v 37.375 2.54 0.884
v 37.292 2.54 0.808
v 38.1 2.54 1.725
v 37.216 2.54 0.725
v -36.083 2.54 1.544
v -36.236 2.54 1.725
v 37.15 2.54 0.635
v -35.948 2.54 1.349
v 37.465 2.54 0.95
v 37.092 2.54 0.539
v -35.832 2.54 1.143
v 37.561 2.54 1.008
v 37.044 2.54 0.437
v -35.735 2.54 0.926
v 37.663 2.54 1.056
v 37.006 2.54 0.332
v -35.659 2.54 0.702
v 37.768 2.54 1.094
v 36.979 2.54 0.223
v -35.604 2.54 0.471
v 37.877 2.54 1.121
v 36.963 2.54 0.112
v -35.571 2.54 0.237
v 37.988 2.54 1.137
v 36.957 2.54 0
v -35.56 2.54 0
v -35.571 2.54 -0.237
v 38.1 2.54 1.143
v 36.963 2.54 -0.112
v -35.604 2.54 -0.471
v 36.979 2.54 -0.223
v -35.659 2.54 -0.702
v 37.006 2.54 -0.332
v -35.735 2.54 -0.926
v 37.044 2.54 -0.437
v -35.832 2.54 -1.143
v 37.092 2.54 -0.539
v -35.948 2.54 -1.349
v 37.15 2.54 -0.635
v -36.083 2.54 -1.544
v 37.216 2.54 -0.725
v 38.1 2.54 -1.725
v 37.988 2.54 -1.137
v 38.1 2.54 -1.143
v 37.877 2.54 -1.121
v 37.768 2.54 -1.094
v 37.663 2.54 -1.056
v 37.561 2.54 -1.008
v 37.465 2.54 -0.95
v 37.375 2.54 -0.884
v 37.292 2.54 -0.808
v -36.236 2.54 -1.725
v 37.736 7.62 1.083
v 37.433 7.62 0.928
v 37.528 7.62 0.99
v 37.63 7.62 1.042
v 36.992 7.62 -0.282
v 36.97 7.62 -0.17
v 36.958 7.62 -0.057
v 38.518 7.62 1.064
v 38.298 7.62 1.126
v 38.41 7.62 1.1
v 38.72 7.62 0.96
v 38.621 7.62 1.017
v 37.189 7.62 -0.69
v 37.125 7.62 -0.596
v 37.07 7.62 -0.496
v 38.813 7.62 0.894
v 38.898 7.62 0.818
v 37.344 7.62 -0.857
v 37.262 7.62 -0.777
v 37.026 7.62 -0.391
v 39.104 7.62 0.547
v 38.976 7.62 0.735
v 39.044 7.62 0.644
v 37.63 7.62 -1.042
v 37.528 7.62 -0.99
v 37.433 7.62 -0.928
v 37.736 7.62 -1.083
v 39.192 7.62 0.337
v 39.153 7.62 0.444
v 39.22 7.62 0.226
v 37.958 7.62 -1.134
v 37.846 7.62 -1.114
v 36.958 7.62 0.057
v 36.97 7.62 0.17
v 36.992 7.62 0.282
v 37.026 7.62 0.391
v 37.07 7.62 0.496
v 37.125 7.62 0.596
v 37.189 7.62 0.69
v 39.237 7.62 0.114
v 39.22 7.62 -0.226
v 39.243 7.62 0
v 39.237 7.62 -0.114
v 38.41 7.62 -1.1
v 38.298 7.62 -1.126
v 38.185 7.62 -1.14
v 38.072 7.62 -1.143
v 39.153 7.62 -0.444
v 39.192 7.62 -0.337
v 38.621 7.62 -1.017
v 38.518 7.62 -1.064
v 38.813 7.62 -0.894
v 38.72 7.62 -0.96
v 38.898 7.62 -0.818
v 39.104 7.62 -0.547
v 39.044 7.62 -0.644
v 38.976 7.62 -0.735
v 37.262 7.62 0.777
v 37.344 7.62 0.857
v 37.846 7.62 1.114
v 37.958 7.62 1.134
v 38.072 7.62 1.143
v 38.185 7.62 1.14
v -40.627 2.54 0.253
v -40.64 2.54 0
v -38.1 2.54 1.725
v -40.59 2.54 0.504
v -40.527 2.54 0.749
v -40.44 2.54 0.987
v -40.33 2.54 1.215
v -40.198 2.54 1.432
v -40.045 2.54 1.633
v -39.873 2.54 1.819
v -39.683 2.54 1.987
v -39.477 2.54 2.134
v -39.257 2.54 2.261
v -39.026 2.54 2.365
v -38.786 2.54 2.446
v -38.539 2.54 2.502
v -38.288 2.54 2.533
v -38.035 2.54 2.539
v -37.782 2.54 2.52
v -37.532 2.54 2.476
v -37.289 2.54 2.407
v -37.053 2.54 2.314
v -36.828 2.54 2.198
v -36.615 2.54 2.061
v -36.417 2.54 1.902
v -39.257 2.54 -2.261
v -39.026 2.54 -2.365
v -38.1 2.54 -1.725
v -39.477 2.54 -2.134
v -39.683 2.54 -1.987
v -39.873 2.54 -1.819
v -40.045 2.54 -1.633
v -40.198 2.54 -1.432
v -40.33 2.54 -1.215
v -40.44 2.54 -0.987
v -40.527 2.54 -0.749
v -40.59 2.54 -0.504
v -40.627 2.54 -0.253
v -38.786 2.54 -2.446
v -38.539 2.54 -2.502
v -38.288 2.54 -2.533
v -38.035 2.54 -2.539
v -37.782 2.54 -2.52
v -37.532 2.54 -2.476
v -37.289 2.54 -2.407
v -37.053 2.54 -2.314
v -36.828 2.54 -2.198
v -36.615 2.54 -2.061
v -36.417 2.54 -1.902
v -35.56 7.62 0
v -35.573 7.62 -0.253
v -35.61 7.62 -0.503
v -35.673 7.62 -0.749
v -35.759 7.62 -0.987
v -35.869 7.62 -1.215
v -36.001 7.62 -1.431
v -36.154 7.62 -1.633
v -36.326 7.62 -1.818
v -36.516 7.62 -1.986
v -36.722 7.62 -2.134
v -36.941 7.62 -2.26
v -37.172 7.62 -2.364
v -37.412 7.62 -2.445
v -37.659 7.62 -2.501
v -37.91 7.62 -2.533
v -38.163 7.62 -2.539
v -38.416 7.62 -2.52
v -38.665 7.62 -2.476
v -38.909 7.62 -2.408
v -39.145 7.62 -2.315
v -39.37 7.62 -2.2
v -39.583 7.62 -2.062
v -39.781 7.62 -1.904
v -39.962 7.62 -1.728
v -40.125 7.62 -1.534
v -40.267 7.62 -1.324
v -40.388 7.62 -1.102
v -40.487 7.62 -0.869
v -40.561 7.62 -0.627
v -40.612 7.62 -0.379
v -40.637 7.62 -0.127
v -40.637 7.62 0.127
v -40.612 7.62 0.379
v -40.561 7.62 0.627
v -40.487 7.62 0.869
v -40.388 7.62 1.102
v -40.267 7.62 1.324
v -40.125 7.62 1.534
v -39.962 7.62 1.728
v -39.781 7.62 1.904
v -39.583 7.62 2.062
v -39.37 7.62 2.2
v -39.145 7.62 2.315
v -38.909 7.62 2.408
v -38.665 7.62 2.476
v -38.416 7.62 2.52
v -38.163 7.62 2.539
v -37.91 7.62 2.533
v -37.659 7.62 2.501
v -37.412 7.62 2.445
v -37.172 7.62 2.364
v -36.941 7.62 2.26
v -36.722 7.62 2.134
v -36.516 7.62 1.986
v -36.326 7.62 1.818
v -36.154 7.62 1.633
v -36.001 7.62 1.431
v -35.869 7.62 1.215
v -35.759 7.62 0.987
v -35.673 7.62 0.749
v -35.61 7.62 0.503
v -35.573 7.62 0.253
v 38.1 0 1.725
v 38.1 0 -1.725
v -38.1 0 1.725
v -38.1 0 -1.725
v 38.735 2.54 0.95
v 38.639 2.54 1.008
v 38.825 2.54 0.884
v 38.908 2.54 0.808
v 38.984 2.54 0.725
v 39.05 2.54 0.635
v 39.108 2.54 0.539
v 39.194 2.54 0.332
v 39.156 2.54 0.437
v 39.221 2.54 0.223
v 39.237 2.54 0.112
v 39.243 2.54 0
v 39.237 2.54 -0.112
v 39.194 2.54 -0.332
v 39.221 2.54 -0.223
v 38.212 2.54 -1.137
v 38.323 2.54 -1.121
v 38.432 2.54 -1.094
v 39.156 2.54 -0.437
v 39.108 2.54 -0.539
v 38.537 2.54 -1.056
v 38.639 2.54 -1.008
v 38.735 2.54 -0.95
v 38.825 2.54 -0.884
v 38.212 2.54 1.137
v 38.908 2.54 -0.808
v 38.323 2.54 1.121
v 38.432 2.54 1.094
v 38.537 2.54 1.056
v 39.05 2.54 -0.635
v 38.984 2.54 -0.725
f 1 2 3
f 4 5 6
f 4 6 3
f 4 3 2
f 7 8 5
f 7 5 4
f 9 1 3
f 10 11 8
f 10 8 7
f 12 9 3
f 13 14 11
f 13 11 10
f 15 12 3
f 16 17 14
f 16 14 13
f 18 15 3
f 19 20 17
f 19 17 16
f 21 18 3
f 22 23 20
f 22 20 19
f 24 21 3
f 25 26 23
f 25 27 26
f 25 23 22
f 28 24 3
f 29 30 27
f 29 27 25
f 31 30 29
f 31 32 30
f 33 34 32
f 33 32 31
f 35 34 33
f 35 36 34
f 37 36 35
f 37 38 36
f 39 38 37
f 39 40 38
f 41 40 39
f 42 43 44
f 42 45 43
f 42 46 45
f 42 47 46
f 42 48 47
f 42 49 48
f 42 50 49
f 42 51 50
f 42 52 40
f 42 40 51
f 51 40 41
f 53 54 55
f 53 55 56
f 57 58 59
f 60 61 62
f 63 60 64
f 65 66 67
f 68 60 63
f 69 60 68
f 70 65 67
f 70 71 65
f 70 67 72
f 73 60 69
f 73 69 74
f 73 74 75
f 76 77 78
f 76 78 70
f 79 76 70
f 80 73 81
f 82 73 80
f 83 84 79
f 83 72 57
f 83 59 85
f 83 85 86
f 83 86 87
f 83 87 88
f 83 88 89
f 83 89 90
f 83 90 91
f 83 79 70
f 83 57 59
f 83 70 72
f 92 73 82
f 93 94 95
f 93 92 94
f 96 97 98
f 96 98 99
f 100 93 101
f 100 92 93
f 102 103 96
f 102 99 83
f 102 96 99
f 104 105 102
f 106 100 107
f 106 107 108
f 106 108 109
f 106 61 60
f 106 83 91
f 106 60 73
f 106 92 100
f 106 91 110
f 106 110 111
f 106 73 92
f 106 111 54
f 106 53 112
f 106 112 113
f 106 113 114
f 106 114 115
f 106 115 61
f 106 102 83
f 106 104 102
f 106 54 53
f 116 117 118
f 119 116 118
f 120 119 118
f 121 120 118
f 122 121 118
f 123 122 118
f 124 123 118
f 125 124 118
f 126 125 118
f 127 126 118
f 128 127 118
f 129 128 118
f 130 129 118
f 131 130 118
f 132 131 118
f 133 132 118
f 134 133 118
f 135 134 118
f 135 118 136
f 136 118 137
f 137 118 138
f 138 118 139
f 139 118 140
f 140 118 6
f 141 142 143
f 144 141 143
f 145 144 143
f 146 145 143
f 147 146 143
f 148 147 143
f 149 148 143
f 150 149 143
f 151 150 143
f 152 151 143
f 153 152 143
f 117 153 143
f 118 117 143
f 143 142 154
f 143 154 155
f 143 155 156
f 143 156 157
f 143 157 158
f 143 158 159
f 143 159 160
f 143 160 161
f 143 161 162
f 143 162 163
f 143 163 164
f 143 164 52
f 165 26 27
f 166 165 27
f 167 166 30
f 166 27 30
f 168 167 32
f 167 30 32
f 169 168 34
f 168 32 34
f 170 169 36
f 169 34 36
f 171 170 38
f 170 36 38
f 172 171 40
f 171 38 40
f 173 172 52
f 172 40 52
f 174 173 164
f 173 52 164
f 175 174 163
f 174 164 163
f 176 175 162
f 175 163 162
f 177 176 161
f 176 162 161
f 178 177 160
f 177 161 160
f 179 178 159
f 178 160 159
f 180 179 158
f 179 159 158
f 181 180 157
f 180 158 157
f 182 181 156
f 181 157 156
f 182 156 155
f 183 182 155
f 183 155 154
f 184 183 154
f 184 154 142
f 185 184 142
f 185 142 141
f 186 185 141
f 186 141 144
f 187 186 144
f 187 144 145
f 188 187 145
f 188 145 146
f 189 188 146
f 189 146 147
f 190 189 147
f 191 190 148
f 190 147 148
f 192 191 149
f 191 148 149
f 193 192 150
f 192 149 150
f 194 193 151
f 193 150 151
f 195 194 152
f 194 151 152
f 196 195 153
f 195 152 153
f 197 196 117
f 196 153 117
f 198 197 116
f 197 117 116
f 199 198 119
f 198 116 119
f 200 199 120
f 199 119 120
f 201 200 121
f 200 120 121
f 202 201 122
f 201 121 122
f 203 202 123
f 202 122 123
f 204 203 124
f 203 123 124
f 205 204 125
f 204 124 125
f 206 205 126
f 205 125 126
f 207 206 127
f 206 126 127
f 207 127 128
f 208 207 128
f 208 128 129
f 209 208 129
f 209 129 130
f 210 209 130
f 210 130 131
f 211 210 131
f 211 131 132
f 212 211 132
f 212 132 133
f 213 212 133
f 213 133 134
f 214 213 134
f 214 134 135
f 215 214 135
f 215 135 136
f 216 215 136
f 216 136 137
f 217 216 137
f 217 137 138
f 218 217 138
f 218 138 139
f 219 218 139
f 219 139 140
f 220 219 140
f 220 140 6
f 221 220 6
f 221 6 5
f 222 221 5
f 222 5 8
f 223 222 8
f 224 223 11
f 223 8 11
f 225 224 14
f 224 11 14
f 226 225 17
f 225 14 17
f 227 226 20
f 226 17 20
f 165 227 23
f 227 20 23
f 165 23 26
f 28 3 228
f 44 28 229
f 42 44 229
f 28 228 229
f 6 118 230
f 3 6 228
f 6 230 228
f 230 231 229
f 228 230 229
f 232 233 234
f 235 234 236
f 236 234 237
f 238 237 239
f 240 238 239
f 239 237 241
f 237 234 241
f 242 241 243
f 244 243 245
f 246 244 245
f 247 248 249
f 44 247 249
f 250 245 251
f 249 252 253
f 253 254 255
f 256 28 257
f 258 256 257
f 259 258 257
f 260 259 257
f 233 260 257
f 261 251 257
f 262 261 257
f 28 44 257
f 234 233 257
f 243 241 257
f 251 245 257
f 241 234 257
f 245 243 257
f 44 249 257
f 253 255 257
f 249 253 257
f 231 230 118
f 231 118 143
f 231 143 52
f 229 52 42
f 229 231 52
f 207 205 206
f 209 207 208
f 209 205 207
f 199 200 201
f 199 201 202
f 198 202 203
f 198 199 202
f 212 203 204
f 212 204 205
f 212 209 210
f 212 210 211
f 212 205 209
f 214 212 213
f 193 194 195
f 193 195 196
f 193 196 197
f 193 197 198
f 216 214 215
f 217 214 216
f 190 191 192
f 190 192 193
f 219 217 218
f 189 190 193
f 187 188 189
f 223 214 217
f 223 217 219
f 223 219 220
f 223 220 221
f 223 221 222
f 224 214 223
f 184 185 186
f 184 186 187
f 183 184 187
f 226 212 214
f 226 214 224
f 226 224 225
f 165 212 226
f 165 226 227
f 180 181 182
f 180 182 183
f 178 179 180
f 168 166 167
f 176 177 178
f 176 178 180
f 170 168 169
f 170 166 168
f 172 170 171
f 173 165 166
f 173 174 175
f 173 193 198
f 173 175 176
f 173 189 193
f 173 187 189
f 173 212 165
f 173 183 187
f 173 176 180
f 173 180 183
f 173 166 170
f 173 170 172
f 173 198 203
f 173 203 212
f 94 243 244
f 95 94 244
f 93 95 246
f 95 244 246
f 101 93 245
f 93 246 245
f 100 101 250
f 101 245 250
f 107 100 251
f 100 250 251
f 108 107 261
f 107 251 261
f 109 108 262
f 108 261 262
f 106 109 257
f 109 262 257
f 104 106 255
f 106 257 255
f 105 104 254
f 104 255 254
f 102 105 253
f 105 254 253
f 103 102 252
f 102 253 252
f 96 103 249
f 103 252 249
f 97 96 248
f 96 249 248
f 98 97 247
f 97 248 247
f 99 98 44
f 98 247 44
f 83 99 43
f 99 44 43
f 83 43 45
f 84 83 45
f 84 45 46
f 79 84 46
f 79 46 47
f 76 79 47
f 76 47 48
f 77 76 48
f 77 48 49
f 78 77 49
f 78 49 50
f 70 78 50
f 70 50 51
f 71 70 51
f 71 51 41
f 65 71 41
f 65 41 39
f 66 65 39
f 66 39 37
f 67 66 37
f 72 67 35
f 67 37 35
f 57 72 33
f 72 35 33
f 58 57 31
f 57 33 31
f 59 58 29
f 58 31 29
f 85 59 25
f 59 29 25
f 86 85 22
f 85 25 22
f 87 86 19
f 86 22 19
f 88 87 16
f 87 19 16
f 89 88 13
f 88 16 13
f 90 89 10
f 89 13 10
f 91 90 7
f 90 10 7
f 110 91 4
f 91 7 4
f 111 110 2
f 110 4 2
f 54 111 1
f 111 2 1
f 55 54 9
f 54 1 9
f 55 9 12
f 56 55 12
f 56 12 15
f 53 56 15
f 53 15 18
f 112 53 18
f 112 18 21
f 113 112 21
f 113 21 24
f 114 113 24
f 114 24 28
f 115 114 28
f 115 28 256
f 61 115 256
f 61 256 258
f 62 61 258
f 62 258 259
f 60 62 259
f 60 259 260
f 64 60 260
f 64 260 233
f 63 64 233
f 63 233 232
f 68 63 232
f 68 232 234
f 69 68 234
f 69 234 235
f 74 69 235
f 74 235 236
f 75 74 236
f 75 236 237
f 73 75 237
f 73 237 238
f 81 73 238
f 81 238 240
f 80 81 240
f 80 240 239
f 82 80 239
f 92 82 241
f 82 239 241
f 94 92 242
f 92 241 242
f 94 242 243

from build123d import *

# Parameters (mm, degrees)
SKETCH1_W           = 76.2
SKETCH1_H           = 3.45052473
BOSS_EXTRUDE1_DEPTH = 2.54
SKETCH2_R           = 2.54
BOSS_EXTRUDE2_DEPTH = 5.08
SKETCH3_R           = 1.143
BOSS_EXTRUDE3_DEPTH = 5.08


with BuildPart() as part:
    # Sketch1 → Boss-Extrude1 (new body)
    with BuildSketch(Plane(origin=(0, 0, 0), x_dir=(1, 0, 0), z_dir=(0, 1, 0))):
        Rectangle(SKETCH1_W, SKETCH1_H)
    extrude(amount=BOSS_EXTRUDE1_DEPTH)

    # Sketch2 → Boss-Extrude2 (add)
    with BuildSketch(Plane(origin=(0, 2.54, 0), x_dir=(1, 0, 0), z_dir=(0, 1, 0))):
        with Locations((-38.1, 0)):
            Circle(SKETCH2_R)
    extrude(amount=BOSS_EXTRUDE2_DEPTH)

    # Sketch3 → Boss-Extrude3 (add)
    with BuildSketch(Plane(origin=(0, 2.54, 0), x_dir=(1, 0, 0), z_dir=(0, 1, 0))):
        with Locations((38.1, 0)):
            Circle(SKETCH3_R)
    extrude(amount=BOSS_EXTRUDE3_DEPTH)


solid = part.part
